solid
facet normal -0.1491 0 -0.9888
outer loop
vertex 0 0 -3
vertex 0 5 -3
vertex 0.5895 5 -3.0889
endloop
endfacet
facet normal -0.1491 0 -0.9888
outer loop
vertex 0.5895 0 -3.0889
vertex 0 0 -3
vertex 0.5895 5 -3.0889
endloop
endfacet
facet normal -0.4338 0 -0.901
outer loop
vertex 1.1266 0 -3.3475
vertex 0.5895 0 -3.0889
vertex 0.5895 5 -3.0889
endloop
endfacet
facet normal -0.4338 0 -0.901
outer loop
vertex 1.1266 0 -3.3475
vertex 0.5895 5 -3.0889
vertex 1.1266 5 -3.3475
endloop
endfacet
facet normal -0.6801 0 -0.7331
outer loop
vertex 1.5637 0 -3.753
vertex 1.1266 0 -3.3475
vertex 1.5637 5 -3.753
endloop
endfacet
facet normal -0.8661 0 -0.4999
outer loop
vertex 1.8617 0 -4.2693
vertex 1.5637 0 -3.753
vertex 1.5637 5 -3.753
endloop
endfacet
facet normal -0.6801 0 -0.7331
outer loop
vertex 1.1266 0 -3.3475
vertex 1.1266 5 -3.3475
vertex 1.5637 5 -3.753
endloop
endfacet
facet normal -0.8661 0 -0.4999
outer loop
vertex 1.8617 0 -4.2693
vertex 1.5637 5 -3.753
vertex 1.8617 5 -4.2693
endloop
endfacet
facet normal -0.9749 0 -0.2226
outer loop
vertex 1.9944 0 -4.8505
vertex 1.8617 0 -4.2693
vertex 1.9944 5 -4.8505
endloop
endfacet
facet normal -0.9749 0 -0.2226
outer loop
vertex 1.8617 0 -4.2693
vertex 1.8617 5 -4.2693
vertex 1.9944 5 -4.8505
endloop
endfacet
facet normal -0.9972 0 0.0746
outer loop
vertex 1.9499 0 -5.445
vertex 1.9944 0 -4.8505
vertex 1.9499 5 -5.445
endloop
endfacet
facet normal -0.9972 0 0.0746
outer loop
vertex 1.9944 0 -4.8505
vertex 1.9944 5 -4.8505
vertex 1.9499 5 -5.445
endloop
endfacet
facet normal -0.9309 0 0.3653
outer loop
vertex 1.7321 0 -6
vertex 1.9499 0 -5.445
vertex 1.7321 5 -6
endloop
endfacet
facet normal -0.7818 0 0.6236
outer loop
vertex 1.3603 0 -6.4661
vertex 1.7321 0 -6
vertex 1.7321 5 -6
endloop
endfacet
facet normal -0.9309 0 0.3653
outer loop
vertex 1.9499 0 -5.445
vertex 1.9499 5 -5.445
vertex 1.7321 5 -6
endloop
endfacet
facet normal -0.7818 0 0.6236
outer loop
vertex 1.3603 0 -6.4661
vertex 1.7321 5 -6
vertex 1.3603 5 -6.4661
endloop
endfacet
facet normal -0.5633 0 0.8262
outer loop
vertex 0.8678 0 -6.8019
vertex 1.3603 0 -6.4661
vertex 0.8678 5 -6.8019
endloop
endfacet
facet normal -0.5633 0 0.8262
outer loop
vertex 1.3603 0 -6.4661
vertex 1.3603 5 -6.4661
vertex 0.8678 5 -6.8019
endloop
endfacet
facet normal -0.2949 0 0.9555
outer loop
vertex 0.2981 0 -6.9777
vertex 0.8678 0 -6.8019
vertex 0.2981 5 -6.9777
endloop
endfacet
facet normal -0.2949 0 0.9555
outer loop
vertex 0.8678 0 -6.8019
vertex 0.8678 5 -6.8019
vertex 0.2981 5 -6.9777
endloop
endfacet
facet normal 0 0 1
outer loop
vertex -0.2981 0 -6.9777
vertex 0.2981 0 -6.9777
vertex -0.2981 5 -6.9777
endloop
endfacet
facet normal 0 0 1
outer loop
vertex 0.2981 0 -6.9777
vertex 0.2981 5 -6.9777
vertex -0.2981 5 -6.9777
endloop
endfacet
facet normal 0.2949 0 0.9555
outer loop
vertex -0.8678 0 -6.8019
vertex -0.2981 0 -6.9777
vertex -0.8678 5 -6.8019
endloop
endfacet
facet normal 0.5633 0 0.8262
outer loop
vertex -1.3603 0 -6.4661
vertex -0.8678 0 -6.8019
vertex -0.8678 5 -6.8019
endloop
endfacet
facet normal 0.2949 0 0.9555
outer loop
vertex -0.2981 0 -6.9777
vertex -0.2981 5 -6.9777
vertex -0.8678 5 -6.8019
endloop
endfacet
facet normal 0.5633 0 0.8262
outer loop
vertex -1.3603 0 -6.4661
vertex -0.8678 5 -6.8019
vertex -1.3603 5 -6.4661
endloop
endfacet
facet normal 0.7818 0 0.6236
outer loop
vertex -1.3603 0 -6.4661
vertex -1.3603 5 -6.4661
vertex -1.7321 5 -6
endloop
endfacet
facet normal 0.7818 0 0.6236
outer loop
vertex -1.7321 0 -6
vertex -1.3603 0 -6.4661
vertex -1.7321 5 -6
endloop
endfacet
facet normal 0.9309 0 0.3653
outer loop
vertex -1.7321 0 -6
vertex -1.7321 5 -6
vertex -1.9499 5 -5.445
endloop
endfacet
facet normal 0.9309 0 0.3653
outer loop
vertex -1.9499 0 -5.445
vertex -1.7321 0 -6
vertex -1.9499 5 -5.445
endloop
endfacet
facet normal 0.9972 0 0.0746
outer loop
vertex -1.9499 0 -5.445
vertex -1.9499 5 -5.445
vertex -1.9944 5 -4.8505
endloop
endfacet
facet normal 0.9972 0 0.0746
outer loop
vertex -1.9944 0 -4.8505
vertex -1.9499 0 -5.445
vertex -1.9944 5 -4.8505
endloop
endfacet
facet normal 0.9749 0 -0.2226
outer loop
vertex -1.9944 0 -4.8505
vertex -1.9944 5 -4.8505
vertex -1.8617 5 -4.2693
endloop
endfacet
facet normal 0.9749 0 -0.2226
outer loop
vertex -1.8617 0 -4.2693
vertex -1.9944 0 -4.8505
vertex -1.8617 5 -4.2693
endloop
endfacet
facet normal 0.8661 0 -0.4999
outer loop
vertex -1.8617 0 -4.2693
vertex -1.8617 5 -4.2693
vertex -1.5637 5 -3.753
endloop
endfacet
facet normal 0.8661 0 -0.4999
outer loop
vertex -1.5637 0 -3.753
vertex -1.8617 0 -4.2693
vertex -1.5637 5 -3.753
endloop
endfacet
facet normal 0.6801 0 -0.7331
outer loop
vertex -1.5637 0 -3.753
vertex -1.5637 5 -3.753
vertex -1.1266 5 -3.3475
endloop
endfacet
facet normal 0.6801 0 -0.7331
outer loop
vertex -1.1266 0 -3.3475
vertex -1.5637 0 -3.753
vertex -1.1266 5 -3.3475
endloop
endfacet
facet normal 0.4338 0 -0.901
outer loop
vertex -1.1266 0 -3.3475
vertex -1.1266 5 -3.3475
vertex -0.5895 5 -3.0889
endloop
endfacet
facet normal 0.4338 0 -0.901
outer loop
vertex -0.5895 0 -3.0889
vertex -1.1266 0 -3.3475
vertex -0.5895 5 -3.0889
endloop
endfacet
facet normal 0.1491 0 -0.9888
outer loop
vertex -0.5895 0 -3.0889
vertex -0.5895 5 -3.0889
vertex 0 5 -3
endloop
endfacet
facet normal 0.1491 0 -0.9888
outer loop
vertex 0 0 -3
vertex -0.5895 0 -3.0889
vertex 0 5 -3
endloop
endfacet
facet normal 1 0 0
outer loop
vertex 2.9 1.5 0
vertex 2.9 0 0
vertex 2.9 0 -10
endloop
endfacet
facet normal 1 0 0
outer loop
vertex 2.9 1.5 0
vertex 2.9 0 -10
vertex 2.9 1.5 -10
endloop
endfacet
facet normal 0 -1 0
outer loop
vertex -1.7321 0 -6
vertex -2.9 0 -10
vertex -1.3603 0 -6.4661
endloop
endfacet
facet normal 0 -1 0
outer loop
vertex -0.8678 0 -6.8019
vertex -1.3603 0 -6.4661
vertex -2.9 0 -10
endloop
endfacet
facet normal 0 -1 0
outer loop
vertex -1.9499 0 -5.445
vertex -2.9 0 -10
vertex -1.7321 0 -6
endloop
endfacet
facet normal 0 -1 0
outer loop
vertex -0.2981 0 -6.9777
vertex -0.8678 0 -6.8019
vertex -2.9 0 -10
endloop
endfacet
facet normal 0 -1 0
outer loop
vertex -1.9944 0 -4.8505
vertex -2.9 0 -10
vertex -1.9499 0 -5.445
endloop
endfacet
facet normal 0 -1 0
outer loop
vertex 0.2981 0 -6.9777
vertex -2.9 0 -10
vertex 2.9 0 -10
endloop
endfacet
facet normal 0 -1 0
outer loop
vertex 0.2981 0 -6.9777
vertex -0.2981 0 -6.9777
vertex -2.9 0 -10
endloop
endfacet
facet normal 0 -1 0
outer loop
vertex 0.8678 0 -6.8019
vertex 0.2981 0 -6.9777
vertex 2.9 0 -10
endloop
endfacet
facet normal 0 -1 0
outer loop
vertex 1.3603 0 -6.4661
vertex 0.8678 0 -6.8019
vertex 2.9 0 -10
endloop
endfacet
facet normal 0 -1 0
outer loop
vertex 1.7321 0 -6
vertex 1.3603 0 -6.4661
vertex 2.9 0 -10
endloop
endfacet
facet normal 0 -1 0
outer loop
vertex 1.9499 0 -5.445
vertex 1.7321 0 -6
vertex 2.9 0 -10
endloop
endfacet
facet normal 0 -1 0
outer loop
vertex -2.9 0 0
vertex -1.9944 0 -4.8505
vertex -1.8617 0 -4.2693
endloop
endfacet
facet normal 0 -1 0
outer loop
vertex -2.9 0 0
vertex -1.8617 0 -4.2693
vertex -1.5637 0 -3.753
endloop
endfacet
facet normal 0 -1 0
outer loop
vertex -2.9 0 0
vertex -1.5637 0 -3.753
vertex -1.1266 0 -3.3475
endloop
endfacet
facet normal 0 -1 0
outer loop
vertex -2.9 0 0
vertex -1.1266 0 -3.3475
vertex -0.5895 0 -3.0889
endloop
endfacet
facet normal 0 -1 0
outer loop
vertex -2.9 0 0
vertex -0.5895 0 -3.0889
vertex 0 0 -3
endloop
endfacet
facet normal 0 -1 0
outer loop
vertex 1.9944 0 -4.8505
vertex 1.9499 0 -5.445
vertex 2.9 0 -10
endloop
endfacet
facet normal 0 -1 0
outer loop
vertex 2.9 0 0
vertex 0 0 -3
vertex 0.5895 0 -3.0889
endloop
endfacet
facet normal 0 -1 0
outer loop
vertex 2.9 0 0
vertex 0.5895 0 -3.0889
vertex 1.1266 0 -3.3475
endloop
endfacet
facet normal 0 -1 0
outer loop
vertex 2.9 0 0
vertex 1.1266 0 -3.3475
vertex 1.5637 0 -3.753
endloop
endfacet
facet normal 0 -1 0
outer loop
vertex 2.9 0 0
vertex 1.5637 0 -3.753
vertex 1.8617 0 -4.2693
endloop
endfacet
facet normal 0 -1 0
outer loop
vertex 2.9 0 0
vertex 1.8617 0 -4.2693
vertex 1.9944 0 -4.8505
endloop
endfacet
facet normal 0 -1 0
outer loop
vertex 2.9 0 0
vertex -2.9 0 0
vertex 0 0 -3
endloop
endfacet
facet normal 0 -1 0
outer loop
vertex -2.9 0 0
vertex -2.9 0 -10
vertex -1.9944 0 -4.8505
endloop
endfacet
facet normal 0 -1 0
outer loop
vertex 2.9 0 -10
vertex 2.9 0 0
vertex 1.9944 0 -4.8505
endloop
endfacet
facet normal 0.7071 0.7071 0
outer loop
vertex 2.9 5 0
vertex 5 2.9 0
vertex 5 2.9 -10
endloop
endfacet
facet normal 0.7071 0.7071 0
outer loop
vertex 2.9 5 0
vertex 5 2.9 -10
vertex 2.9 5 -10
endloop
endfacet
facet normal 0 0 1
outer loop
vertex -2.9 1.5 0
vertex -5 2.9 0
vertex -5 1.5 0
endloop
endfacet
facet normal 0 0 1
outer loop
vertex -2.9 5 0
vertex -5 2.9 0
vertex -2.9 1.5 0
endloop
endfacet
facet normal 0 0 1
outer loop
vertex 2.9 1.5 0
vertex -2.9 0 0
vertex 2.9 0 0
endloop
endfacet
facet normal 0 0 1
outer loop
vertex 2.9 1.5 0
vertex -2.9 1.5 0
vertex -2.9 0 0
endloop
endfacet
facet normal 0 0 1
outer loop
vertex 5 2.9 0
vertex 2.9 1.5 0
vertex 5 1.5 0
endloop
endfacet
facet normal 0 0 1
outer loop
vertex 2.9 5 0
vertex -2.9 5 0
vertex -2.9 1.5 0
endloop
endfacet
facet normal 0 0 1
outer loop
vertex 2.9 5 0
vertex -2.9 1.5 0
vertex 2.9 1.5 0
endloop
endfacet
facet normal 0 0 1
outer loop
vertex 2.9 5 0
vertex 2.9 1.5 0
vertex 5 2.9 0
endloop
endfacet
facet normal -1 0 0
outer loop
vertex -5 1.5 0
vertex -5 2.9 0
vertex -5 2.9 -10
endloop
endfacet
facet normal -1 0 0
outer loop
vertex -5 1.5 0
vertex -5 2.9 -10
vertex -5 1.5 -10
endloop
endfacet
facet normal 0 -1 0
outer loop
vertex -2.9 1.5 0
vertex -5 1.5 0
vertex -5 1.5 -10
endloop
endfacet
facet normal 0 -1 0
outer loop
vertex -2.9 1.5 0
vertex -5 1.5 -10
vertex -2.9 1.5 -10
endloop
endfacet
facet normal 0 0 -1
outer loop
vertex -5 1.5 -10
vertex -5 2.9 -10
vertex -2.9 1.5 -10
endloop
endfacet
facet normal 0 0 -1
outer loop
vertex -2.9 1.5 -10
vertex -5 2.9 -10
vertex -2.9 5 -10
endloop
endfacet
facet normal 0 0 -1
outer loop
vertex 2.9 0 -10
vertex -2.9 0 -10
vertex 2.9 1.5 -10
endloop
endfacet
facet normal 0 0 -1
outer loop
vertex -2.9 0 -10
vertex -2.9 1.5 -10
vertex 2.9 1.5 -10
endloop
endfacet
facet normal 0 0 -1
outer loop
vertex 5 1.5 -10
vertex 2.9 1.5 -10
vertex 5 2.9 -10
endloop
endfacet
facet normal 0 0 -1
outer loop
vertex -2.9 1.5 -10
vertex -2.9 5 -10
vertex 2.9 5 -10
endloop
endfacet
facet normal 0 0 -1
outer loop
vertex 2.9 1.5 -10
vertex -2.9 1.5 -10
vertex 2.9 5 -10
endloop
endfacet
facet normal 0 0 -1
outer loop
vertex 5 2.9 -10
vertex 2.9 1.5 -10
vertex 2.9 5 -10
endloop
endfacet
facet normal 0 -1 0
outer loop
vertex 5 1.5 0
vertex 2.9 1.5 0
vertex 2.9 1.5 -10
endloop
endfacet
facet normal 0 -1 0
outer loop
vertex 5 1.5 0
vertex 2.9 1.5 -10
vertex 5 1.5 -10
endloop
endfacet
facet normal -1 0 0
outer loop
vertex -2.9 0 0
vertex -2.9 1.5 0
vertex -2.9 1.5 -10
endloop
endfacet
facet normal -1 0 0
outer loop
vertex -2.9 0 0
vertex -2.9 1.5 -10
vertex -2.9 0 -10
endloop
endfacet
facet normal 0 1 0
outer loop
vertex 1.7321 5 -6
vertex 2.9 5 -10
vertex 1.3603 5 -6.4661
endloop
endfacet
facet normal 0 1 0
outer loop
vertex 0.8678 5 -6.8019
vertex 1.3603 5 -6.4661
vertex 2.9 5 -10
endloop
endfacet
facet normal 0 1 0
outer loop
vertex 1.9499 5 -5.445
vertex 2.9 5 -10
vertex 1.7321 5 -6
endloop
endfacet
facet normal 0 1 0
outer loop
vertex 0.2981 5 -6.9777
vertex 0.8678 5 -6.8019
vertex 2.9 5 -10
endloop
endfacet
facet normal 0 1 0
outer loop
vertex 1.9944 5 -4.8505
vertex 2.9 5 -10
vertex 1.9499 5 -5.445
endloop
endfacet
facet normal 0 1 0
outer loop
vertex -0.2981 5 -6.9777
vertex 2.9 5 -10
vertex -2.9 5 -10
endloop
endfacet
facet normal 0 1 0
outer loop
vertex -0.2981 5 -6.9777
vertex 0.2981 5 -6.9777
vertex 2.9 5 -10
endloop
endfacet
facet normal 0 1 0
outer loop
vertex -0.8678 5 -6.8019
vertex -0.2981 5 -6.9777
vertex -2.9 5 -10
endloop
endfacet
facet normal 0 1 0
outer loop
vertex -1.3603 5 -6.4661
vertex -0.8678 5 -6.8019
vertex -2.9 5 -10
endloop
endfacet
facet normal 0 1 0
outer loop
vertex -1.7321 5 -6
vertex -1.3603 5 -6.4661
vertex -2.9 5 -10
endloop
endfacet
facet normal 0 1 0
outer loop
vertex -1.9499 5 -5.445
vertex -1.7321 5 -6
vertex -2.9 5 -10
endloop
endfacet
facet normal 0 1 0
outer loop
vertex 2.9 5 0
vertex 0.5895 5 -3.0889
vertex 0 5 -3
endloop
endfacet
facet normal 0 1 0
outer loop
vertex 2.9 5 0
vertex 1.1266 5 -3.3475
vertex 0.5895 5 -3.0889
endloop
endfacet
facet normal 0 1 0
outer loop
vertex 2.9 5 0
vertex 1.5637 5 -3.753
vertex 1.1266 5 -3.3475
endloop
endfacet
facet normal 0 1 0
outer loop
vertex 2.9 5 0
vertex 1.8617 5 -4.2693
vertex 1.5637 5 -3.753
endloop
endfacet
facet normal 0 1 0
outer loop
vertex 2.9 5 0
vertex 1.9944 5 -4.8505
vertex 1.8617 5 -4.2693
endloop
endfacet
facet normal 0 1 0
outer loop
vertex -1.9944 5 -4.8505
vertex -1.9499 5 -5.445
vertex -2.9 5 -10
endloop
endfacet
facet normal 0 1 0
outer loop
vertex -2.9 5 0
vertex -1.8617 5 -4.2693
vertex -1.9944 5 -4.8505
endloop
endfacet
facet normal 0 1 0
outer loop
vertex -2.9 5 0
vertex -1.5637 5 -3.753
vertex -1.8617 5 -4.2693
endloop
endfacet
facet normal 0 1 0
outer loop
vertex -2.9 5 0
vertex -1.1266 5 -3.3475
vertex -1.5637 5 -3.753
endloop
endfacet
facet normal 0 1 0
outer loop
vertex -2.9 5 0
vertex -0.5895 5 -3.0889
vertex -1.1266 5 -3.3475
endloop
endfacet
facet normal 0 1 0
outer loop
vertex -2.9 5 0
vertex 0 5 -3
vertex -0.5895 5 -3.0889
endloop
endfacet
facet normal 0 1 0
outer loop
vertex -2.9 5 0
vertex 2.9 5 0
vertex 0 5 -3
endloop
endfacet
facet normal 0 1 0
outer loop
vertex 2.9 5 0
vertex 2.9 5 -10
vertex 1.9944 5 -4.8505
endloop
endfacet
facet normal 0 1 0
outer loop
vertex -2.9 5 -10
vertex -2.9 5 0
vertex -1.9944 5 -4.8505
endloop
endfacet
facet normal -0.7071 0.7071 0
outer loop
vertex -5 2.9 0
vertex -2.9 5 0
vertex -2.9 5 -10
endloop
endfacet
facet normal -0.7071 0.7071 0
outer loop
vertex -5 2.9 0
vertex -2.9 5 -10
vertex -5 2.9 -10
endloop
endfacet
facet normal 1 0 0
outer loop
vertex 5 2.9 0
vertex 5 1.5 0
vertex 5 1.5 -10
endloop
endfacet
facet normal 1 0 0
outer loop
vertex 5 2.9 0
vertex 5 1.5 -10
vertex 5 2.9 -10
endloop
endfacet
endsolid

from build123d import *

# Parameters (mm, degrees)
EXTRUDE_1_DEPTH     = 10
SKETCH_4_R          = 2
CUT_EXTRUDE_1_DEPTH = 13.247448714


with BuildPart() as part:
    # 草图1 → 凸台-拉伸1 (new body)
    with BuildSketch(Plane.XY):
        Polygon((-2.9, 0), (2.9, 0), (2.9, 1.5), (5, 1.5), (5, 2.9), (2.9, 5), (-2.9, 5), (-5, 2.9), (-5, 1.5), (-2.9, 1.5), align=None)
    extrude(amount=-EXTRUDE_1_DEPTH)

    # 草图4 → 切除-拉伸1 (cut, through all)
    with BuildSketch(Plane(origin=(0, 5, 0), x_dir=(1, 0, 0), z_dir=(0, 1, 0))):
        with Locations(Location((0, 5, 0), (0, 0, 270))):
            Circle(SKETCH_4_R)
    extrude(amount=-CUT_EXTRUDE_1_DEPTH, mode=Mode.SUBTRACT)


solid = part.part
